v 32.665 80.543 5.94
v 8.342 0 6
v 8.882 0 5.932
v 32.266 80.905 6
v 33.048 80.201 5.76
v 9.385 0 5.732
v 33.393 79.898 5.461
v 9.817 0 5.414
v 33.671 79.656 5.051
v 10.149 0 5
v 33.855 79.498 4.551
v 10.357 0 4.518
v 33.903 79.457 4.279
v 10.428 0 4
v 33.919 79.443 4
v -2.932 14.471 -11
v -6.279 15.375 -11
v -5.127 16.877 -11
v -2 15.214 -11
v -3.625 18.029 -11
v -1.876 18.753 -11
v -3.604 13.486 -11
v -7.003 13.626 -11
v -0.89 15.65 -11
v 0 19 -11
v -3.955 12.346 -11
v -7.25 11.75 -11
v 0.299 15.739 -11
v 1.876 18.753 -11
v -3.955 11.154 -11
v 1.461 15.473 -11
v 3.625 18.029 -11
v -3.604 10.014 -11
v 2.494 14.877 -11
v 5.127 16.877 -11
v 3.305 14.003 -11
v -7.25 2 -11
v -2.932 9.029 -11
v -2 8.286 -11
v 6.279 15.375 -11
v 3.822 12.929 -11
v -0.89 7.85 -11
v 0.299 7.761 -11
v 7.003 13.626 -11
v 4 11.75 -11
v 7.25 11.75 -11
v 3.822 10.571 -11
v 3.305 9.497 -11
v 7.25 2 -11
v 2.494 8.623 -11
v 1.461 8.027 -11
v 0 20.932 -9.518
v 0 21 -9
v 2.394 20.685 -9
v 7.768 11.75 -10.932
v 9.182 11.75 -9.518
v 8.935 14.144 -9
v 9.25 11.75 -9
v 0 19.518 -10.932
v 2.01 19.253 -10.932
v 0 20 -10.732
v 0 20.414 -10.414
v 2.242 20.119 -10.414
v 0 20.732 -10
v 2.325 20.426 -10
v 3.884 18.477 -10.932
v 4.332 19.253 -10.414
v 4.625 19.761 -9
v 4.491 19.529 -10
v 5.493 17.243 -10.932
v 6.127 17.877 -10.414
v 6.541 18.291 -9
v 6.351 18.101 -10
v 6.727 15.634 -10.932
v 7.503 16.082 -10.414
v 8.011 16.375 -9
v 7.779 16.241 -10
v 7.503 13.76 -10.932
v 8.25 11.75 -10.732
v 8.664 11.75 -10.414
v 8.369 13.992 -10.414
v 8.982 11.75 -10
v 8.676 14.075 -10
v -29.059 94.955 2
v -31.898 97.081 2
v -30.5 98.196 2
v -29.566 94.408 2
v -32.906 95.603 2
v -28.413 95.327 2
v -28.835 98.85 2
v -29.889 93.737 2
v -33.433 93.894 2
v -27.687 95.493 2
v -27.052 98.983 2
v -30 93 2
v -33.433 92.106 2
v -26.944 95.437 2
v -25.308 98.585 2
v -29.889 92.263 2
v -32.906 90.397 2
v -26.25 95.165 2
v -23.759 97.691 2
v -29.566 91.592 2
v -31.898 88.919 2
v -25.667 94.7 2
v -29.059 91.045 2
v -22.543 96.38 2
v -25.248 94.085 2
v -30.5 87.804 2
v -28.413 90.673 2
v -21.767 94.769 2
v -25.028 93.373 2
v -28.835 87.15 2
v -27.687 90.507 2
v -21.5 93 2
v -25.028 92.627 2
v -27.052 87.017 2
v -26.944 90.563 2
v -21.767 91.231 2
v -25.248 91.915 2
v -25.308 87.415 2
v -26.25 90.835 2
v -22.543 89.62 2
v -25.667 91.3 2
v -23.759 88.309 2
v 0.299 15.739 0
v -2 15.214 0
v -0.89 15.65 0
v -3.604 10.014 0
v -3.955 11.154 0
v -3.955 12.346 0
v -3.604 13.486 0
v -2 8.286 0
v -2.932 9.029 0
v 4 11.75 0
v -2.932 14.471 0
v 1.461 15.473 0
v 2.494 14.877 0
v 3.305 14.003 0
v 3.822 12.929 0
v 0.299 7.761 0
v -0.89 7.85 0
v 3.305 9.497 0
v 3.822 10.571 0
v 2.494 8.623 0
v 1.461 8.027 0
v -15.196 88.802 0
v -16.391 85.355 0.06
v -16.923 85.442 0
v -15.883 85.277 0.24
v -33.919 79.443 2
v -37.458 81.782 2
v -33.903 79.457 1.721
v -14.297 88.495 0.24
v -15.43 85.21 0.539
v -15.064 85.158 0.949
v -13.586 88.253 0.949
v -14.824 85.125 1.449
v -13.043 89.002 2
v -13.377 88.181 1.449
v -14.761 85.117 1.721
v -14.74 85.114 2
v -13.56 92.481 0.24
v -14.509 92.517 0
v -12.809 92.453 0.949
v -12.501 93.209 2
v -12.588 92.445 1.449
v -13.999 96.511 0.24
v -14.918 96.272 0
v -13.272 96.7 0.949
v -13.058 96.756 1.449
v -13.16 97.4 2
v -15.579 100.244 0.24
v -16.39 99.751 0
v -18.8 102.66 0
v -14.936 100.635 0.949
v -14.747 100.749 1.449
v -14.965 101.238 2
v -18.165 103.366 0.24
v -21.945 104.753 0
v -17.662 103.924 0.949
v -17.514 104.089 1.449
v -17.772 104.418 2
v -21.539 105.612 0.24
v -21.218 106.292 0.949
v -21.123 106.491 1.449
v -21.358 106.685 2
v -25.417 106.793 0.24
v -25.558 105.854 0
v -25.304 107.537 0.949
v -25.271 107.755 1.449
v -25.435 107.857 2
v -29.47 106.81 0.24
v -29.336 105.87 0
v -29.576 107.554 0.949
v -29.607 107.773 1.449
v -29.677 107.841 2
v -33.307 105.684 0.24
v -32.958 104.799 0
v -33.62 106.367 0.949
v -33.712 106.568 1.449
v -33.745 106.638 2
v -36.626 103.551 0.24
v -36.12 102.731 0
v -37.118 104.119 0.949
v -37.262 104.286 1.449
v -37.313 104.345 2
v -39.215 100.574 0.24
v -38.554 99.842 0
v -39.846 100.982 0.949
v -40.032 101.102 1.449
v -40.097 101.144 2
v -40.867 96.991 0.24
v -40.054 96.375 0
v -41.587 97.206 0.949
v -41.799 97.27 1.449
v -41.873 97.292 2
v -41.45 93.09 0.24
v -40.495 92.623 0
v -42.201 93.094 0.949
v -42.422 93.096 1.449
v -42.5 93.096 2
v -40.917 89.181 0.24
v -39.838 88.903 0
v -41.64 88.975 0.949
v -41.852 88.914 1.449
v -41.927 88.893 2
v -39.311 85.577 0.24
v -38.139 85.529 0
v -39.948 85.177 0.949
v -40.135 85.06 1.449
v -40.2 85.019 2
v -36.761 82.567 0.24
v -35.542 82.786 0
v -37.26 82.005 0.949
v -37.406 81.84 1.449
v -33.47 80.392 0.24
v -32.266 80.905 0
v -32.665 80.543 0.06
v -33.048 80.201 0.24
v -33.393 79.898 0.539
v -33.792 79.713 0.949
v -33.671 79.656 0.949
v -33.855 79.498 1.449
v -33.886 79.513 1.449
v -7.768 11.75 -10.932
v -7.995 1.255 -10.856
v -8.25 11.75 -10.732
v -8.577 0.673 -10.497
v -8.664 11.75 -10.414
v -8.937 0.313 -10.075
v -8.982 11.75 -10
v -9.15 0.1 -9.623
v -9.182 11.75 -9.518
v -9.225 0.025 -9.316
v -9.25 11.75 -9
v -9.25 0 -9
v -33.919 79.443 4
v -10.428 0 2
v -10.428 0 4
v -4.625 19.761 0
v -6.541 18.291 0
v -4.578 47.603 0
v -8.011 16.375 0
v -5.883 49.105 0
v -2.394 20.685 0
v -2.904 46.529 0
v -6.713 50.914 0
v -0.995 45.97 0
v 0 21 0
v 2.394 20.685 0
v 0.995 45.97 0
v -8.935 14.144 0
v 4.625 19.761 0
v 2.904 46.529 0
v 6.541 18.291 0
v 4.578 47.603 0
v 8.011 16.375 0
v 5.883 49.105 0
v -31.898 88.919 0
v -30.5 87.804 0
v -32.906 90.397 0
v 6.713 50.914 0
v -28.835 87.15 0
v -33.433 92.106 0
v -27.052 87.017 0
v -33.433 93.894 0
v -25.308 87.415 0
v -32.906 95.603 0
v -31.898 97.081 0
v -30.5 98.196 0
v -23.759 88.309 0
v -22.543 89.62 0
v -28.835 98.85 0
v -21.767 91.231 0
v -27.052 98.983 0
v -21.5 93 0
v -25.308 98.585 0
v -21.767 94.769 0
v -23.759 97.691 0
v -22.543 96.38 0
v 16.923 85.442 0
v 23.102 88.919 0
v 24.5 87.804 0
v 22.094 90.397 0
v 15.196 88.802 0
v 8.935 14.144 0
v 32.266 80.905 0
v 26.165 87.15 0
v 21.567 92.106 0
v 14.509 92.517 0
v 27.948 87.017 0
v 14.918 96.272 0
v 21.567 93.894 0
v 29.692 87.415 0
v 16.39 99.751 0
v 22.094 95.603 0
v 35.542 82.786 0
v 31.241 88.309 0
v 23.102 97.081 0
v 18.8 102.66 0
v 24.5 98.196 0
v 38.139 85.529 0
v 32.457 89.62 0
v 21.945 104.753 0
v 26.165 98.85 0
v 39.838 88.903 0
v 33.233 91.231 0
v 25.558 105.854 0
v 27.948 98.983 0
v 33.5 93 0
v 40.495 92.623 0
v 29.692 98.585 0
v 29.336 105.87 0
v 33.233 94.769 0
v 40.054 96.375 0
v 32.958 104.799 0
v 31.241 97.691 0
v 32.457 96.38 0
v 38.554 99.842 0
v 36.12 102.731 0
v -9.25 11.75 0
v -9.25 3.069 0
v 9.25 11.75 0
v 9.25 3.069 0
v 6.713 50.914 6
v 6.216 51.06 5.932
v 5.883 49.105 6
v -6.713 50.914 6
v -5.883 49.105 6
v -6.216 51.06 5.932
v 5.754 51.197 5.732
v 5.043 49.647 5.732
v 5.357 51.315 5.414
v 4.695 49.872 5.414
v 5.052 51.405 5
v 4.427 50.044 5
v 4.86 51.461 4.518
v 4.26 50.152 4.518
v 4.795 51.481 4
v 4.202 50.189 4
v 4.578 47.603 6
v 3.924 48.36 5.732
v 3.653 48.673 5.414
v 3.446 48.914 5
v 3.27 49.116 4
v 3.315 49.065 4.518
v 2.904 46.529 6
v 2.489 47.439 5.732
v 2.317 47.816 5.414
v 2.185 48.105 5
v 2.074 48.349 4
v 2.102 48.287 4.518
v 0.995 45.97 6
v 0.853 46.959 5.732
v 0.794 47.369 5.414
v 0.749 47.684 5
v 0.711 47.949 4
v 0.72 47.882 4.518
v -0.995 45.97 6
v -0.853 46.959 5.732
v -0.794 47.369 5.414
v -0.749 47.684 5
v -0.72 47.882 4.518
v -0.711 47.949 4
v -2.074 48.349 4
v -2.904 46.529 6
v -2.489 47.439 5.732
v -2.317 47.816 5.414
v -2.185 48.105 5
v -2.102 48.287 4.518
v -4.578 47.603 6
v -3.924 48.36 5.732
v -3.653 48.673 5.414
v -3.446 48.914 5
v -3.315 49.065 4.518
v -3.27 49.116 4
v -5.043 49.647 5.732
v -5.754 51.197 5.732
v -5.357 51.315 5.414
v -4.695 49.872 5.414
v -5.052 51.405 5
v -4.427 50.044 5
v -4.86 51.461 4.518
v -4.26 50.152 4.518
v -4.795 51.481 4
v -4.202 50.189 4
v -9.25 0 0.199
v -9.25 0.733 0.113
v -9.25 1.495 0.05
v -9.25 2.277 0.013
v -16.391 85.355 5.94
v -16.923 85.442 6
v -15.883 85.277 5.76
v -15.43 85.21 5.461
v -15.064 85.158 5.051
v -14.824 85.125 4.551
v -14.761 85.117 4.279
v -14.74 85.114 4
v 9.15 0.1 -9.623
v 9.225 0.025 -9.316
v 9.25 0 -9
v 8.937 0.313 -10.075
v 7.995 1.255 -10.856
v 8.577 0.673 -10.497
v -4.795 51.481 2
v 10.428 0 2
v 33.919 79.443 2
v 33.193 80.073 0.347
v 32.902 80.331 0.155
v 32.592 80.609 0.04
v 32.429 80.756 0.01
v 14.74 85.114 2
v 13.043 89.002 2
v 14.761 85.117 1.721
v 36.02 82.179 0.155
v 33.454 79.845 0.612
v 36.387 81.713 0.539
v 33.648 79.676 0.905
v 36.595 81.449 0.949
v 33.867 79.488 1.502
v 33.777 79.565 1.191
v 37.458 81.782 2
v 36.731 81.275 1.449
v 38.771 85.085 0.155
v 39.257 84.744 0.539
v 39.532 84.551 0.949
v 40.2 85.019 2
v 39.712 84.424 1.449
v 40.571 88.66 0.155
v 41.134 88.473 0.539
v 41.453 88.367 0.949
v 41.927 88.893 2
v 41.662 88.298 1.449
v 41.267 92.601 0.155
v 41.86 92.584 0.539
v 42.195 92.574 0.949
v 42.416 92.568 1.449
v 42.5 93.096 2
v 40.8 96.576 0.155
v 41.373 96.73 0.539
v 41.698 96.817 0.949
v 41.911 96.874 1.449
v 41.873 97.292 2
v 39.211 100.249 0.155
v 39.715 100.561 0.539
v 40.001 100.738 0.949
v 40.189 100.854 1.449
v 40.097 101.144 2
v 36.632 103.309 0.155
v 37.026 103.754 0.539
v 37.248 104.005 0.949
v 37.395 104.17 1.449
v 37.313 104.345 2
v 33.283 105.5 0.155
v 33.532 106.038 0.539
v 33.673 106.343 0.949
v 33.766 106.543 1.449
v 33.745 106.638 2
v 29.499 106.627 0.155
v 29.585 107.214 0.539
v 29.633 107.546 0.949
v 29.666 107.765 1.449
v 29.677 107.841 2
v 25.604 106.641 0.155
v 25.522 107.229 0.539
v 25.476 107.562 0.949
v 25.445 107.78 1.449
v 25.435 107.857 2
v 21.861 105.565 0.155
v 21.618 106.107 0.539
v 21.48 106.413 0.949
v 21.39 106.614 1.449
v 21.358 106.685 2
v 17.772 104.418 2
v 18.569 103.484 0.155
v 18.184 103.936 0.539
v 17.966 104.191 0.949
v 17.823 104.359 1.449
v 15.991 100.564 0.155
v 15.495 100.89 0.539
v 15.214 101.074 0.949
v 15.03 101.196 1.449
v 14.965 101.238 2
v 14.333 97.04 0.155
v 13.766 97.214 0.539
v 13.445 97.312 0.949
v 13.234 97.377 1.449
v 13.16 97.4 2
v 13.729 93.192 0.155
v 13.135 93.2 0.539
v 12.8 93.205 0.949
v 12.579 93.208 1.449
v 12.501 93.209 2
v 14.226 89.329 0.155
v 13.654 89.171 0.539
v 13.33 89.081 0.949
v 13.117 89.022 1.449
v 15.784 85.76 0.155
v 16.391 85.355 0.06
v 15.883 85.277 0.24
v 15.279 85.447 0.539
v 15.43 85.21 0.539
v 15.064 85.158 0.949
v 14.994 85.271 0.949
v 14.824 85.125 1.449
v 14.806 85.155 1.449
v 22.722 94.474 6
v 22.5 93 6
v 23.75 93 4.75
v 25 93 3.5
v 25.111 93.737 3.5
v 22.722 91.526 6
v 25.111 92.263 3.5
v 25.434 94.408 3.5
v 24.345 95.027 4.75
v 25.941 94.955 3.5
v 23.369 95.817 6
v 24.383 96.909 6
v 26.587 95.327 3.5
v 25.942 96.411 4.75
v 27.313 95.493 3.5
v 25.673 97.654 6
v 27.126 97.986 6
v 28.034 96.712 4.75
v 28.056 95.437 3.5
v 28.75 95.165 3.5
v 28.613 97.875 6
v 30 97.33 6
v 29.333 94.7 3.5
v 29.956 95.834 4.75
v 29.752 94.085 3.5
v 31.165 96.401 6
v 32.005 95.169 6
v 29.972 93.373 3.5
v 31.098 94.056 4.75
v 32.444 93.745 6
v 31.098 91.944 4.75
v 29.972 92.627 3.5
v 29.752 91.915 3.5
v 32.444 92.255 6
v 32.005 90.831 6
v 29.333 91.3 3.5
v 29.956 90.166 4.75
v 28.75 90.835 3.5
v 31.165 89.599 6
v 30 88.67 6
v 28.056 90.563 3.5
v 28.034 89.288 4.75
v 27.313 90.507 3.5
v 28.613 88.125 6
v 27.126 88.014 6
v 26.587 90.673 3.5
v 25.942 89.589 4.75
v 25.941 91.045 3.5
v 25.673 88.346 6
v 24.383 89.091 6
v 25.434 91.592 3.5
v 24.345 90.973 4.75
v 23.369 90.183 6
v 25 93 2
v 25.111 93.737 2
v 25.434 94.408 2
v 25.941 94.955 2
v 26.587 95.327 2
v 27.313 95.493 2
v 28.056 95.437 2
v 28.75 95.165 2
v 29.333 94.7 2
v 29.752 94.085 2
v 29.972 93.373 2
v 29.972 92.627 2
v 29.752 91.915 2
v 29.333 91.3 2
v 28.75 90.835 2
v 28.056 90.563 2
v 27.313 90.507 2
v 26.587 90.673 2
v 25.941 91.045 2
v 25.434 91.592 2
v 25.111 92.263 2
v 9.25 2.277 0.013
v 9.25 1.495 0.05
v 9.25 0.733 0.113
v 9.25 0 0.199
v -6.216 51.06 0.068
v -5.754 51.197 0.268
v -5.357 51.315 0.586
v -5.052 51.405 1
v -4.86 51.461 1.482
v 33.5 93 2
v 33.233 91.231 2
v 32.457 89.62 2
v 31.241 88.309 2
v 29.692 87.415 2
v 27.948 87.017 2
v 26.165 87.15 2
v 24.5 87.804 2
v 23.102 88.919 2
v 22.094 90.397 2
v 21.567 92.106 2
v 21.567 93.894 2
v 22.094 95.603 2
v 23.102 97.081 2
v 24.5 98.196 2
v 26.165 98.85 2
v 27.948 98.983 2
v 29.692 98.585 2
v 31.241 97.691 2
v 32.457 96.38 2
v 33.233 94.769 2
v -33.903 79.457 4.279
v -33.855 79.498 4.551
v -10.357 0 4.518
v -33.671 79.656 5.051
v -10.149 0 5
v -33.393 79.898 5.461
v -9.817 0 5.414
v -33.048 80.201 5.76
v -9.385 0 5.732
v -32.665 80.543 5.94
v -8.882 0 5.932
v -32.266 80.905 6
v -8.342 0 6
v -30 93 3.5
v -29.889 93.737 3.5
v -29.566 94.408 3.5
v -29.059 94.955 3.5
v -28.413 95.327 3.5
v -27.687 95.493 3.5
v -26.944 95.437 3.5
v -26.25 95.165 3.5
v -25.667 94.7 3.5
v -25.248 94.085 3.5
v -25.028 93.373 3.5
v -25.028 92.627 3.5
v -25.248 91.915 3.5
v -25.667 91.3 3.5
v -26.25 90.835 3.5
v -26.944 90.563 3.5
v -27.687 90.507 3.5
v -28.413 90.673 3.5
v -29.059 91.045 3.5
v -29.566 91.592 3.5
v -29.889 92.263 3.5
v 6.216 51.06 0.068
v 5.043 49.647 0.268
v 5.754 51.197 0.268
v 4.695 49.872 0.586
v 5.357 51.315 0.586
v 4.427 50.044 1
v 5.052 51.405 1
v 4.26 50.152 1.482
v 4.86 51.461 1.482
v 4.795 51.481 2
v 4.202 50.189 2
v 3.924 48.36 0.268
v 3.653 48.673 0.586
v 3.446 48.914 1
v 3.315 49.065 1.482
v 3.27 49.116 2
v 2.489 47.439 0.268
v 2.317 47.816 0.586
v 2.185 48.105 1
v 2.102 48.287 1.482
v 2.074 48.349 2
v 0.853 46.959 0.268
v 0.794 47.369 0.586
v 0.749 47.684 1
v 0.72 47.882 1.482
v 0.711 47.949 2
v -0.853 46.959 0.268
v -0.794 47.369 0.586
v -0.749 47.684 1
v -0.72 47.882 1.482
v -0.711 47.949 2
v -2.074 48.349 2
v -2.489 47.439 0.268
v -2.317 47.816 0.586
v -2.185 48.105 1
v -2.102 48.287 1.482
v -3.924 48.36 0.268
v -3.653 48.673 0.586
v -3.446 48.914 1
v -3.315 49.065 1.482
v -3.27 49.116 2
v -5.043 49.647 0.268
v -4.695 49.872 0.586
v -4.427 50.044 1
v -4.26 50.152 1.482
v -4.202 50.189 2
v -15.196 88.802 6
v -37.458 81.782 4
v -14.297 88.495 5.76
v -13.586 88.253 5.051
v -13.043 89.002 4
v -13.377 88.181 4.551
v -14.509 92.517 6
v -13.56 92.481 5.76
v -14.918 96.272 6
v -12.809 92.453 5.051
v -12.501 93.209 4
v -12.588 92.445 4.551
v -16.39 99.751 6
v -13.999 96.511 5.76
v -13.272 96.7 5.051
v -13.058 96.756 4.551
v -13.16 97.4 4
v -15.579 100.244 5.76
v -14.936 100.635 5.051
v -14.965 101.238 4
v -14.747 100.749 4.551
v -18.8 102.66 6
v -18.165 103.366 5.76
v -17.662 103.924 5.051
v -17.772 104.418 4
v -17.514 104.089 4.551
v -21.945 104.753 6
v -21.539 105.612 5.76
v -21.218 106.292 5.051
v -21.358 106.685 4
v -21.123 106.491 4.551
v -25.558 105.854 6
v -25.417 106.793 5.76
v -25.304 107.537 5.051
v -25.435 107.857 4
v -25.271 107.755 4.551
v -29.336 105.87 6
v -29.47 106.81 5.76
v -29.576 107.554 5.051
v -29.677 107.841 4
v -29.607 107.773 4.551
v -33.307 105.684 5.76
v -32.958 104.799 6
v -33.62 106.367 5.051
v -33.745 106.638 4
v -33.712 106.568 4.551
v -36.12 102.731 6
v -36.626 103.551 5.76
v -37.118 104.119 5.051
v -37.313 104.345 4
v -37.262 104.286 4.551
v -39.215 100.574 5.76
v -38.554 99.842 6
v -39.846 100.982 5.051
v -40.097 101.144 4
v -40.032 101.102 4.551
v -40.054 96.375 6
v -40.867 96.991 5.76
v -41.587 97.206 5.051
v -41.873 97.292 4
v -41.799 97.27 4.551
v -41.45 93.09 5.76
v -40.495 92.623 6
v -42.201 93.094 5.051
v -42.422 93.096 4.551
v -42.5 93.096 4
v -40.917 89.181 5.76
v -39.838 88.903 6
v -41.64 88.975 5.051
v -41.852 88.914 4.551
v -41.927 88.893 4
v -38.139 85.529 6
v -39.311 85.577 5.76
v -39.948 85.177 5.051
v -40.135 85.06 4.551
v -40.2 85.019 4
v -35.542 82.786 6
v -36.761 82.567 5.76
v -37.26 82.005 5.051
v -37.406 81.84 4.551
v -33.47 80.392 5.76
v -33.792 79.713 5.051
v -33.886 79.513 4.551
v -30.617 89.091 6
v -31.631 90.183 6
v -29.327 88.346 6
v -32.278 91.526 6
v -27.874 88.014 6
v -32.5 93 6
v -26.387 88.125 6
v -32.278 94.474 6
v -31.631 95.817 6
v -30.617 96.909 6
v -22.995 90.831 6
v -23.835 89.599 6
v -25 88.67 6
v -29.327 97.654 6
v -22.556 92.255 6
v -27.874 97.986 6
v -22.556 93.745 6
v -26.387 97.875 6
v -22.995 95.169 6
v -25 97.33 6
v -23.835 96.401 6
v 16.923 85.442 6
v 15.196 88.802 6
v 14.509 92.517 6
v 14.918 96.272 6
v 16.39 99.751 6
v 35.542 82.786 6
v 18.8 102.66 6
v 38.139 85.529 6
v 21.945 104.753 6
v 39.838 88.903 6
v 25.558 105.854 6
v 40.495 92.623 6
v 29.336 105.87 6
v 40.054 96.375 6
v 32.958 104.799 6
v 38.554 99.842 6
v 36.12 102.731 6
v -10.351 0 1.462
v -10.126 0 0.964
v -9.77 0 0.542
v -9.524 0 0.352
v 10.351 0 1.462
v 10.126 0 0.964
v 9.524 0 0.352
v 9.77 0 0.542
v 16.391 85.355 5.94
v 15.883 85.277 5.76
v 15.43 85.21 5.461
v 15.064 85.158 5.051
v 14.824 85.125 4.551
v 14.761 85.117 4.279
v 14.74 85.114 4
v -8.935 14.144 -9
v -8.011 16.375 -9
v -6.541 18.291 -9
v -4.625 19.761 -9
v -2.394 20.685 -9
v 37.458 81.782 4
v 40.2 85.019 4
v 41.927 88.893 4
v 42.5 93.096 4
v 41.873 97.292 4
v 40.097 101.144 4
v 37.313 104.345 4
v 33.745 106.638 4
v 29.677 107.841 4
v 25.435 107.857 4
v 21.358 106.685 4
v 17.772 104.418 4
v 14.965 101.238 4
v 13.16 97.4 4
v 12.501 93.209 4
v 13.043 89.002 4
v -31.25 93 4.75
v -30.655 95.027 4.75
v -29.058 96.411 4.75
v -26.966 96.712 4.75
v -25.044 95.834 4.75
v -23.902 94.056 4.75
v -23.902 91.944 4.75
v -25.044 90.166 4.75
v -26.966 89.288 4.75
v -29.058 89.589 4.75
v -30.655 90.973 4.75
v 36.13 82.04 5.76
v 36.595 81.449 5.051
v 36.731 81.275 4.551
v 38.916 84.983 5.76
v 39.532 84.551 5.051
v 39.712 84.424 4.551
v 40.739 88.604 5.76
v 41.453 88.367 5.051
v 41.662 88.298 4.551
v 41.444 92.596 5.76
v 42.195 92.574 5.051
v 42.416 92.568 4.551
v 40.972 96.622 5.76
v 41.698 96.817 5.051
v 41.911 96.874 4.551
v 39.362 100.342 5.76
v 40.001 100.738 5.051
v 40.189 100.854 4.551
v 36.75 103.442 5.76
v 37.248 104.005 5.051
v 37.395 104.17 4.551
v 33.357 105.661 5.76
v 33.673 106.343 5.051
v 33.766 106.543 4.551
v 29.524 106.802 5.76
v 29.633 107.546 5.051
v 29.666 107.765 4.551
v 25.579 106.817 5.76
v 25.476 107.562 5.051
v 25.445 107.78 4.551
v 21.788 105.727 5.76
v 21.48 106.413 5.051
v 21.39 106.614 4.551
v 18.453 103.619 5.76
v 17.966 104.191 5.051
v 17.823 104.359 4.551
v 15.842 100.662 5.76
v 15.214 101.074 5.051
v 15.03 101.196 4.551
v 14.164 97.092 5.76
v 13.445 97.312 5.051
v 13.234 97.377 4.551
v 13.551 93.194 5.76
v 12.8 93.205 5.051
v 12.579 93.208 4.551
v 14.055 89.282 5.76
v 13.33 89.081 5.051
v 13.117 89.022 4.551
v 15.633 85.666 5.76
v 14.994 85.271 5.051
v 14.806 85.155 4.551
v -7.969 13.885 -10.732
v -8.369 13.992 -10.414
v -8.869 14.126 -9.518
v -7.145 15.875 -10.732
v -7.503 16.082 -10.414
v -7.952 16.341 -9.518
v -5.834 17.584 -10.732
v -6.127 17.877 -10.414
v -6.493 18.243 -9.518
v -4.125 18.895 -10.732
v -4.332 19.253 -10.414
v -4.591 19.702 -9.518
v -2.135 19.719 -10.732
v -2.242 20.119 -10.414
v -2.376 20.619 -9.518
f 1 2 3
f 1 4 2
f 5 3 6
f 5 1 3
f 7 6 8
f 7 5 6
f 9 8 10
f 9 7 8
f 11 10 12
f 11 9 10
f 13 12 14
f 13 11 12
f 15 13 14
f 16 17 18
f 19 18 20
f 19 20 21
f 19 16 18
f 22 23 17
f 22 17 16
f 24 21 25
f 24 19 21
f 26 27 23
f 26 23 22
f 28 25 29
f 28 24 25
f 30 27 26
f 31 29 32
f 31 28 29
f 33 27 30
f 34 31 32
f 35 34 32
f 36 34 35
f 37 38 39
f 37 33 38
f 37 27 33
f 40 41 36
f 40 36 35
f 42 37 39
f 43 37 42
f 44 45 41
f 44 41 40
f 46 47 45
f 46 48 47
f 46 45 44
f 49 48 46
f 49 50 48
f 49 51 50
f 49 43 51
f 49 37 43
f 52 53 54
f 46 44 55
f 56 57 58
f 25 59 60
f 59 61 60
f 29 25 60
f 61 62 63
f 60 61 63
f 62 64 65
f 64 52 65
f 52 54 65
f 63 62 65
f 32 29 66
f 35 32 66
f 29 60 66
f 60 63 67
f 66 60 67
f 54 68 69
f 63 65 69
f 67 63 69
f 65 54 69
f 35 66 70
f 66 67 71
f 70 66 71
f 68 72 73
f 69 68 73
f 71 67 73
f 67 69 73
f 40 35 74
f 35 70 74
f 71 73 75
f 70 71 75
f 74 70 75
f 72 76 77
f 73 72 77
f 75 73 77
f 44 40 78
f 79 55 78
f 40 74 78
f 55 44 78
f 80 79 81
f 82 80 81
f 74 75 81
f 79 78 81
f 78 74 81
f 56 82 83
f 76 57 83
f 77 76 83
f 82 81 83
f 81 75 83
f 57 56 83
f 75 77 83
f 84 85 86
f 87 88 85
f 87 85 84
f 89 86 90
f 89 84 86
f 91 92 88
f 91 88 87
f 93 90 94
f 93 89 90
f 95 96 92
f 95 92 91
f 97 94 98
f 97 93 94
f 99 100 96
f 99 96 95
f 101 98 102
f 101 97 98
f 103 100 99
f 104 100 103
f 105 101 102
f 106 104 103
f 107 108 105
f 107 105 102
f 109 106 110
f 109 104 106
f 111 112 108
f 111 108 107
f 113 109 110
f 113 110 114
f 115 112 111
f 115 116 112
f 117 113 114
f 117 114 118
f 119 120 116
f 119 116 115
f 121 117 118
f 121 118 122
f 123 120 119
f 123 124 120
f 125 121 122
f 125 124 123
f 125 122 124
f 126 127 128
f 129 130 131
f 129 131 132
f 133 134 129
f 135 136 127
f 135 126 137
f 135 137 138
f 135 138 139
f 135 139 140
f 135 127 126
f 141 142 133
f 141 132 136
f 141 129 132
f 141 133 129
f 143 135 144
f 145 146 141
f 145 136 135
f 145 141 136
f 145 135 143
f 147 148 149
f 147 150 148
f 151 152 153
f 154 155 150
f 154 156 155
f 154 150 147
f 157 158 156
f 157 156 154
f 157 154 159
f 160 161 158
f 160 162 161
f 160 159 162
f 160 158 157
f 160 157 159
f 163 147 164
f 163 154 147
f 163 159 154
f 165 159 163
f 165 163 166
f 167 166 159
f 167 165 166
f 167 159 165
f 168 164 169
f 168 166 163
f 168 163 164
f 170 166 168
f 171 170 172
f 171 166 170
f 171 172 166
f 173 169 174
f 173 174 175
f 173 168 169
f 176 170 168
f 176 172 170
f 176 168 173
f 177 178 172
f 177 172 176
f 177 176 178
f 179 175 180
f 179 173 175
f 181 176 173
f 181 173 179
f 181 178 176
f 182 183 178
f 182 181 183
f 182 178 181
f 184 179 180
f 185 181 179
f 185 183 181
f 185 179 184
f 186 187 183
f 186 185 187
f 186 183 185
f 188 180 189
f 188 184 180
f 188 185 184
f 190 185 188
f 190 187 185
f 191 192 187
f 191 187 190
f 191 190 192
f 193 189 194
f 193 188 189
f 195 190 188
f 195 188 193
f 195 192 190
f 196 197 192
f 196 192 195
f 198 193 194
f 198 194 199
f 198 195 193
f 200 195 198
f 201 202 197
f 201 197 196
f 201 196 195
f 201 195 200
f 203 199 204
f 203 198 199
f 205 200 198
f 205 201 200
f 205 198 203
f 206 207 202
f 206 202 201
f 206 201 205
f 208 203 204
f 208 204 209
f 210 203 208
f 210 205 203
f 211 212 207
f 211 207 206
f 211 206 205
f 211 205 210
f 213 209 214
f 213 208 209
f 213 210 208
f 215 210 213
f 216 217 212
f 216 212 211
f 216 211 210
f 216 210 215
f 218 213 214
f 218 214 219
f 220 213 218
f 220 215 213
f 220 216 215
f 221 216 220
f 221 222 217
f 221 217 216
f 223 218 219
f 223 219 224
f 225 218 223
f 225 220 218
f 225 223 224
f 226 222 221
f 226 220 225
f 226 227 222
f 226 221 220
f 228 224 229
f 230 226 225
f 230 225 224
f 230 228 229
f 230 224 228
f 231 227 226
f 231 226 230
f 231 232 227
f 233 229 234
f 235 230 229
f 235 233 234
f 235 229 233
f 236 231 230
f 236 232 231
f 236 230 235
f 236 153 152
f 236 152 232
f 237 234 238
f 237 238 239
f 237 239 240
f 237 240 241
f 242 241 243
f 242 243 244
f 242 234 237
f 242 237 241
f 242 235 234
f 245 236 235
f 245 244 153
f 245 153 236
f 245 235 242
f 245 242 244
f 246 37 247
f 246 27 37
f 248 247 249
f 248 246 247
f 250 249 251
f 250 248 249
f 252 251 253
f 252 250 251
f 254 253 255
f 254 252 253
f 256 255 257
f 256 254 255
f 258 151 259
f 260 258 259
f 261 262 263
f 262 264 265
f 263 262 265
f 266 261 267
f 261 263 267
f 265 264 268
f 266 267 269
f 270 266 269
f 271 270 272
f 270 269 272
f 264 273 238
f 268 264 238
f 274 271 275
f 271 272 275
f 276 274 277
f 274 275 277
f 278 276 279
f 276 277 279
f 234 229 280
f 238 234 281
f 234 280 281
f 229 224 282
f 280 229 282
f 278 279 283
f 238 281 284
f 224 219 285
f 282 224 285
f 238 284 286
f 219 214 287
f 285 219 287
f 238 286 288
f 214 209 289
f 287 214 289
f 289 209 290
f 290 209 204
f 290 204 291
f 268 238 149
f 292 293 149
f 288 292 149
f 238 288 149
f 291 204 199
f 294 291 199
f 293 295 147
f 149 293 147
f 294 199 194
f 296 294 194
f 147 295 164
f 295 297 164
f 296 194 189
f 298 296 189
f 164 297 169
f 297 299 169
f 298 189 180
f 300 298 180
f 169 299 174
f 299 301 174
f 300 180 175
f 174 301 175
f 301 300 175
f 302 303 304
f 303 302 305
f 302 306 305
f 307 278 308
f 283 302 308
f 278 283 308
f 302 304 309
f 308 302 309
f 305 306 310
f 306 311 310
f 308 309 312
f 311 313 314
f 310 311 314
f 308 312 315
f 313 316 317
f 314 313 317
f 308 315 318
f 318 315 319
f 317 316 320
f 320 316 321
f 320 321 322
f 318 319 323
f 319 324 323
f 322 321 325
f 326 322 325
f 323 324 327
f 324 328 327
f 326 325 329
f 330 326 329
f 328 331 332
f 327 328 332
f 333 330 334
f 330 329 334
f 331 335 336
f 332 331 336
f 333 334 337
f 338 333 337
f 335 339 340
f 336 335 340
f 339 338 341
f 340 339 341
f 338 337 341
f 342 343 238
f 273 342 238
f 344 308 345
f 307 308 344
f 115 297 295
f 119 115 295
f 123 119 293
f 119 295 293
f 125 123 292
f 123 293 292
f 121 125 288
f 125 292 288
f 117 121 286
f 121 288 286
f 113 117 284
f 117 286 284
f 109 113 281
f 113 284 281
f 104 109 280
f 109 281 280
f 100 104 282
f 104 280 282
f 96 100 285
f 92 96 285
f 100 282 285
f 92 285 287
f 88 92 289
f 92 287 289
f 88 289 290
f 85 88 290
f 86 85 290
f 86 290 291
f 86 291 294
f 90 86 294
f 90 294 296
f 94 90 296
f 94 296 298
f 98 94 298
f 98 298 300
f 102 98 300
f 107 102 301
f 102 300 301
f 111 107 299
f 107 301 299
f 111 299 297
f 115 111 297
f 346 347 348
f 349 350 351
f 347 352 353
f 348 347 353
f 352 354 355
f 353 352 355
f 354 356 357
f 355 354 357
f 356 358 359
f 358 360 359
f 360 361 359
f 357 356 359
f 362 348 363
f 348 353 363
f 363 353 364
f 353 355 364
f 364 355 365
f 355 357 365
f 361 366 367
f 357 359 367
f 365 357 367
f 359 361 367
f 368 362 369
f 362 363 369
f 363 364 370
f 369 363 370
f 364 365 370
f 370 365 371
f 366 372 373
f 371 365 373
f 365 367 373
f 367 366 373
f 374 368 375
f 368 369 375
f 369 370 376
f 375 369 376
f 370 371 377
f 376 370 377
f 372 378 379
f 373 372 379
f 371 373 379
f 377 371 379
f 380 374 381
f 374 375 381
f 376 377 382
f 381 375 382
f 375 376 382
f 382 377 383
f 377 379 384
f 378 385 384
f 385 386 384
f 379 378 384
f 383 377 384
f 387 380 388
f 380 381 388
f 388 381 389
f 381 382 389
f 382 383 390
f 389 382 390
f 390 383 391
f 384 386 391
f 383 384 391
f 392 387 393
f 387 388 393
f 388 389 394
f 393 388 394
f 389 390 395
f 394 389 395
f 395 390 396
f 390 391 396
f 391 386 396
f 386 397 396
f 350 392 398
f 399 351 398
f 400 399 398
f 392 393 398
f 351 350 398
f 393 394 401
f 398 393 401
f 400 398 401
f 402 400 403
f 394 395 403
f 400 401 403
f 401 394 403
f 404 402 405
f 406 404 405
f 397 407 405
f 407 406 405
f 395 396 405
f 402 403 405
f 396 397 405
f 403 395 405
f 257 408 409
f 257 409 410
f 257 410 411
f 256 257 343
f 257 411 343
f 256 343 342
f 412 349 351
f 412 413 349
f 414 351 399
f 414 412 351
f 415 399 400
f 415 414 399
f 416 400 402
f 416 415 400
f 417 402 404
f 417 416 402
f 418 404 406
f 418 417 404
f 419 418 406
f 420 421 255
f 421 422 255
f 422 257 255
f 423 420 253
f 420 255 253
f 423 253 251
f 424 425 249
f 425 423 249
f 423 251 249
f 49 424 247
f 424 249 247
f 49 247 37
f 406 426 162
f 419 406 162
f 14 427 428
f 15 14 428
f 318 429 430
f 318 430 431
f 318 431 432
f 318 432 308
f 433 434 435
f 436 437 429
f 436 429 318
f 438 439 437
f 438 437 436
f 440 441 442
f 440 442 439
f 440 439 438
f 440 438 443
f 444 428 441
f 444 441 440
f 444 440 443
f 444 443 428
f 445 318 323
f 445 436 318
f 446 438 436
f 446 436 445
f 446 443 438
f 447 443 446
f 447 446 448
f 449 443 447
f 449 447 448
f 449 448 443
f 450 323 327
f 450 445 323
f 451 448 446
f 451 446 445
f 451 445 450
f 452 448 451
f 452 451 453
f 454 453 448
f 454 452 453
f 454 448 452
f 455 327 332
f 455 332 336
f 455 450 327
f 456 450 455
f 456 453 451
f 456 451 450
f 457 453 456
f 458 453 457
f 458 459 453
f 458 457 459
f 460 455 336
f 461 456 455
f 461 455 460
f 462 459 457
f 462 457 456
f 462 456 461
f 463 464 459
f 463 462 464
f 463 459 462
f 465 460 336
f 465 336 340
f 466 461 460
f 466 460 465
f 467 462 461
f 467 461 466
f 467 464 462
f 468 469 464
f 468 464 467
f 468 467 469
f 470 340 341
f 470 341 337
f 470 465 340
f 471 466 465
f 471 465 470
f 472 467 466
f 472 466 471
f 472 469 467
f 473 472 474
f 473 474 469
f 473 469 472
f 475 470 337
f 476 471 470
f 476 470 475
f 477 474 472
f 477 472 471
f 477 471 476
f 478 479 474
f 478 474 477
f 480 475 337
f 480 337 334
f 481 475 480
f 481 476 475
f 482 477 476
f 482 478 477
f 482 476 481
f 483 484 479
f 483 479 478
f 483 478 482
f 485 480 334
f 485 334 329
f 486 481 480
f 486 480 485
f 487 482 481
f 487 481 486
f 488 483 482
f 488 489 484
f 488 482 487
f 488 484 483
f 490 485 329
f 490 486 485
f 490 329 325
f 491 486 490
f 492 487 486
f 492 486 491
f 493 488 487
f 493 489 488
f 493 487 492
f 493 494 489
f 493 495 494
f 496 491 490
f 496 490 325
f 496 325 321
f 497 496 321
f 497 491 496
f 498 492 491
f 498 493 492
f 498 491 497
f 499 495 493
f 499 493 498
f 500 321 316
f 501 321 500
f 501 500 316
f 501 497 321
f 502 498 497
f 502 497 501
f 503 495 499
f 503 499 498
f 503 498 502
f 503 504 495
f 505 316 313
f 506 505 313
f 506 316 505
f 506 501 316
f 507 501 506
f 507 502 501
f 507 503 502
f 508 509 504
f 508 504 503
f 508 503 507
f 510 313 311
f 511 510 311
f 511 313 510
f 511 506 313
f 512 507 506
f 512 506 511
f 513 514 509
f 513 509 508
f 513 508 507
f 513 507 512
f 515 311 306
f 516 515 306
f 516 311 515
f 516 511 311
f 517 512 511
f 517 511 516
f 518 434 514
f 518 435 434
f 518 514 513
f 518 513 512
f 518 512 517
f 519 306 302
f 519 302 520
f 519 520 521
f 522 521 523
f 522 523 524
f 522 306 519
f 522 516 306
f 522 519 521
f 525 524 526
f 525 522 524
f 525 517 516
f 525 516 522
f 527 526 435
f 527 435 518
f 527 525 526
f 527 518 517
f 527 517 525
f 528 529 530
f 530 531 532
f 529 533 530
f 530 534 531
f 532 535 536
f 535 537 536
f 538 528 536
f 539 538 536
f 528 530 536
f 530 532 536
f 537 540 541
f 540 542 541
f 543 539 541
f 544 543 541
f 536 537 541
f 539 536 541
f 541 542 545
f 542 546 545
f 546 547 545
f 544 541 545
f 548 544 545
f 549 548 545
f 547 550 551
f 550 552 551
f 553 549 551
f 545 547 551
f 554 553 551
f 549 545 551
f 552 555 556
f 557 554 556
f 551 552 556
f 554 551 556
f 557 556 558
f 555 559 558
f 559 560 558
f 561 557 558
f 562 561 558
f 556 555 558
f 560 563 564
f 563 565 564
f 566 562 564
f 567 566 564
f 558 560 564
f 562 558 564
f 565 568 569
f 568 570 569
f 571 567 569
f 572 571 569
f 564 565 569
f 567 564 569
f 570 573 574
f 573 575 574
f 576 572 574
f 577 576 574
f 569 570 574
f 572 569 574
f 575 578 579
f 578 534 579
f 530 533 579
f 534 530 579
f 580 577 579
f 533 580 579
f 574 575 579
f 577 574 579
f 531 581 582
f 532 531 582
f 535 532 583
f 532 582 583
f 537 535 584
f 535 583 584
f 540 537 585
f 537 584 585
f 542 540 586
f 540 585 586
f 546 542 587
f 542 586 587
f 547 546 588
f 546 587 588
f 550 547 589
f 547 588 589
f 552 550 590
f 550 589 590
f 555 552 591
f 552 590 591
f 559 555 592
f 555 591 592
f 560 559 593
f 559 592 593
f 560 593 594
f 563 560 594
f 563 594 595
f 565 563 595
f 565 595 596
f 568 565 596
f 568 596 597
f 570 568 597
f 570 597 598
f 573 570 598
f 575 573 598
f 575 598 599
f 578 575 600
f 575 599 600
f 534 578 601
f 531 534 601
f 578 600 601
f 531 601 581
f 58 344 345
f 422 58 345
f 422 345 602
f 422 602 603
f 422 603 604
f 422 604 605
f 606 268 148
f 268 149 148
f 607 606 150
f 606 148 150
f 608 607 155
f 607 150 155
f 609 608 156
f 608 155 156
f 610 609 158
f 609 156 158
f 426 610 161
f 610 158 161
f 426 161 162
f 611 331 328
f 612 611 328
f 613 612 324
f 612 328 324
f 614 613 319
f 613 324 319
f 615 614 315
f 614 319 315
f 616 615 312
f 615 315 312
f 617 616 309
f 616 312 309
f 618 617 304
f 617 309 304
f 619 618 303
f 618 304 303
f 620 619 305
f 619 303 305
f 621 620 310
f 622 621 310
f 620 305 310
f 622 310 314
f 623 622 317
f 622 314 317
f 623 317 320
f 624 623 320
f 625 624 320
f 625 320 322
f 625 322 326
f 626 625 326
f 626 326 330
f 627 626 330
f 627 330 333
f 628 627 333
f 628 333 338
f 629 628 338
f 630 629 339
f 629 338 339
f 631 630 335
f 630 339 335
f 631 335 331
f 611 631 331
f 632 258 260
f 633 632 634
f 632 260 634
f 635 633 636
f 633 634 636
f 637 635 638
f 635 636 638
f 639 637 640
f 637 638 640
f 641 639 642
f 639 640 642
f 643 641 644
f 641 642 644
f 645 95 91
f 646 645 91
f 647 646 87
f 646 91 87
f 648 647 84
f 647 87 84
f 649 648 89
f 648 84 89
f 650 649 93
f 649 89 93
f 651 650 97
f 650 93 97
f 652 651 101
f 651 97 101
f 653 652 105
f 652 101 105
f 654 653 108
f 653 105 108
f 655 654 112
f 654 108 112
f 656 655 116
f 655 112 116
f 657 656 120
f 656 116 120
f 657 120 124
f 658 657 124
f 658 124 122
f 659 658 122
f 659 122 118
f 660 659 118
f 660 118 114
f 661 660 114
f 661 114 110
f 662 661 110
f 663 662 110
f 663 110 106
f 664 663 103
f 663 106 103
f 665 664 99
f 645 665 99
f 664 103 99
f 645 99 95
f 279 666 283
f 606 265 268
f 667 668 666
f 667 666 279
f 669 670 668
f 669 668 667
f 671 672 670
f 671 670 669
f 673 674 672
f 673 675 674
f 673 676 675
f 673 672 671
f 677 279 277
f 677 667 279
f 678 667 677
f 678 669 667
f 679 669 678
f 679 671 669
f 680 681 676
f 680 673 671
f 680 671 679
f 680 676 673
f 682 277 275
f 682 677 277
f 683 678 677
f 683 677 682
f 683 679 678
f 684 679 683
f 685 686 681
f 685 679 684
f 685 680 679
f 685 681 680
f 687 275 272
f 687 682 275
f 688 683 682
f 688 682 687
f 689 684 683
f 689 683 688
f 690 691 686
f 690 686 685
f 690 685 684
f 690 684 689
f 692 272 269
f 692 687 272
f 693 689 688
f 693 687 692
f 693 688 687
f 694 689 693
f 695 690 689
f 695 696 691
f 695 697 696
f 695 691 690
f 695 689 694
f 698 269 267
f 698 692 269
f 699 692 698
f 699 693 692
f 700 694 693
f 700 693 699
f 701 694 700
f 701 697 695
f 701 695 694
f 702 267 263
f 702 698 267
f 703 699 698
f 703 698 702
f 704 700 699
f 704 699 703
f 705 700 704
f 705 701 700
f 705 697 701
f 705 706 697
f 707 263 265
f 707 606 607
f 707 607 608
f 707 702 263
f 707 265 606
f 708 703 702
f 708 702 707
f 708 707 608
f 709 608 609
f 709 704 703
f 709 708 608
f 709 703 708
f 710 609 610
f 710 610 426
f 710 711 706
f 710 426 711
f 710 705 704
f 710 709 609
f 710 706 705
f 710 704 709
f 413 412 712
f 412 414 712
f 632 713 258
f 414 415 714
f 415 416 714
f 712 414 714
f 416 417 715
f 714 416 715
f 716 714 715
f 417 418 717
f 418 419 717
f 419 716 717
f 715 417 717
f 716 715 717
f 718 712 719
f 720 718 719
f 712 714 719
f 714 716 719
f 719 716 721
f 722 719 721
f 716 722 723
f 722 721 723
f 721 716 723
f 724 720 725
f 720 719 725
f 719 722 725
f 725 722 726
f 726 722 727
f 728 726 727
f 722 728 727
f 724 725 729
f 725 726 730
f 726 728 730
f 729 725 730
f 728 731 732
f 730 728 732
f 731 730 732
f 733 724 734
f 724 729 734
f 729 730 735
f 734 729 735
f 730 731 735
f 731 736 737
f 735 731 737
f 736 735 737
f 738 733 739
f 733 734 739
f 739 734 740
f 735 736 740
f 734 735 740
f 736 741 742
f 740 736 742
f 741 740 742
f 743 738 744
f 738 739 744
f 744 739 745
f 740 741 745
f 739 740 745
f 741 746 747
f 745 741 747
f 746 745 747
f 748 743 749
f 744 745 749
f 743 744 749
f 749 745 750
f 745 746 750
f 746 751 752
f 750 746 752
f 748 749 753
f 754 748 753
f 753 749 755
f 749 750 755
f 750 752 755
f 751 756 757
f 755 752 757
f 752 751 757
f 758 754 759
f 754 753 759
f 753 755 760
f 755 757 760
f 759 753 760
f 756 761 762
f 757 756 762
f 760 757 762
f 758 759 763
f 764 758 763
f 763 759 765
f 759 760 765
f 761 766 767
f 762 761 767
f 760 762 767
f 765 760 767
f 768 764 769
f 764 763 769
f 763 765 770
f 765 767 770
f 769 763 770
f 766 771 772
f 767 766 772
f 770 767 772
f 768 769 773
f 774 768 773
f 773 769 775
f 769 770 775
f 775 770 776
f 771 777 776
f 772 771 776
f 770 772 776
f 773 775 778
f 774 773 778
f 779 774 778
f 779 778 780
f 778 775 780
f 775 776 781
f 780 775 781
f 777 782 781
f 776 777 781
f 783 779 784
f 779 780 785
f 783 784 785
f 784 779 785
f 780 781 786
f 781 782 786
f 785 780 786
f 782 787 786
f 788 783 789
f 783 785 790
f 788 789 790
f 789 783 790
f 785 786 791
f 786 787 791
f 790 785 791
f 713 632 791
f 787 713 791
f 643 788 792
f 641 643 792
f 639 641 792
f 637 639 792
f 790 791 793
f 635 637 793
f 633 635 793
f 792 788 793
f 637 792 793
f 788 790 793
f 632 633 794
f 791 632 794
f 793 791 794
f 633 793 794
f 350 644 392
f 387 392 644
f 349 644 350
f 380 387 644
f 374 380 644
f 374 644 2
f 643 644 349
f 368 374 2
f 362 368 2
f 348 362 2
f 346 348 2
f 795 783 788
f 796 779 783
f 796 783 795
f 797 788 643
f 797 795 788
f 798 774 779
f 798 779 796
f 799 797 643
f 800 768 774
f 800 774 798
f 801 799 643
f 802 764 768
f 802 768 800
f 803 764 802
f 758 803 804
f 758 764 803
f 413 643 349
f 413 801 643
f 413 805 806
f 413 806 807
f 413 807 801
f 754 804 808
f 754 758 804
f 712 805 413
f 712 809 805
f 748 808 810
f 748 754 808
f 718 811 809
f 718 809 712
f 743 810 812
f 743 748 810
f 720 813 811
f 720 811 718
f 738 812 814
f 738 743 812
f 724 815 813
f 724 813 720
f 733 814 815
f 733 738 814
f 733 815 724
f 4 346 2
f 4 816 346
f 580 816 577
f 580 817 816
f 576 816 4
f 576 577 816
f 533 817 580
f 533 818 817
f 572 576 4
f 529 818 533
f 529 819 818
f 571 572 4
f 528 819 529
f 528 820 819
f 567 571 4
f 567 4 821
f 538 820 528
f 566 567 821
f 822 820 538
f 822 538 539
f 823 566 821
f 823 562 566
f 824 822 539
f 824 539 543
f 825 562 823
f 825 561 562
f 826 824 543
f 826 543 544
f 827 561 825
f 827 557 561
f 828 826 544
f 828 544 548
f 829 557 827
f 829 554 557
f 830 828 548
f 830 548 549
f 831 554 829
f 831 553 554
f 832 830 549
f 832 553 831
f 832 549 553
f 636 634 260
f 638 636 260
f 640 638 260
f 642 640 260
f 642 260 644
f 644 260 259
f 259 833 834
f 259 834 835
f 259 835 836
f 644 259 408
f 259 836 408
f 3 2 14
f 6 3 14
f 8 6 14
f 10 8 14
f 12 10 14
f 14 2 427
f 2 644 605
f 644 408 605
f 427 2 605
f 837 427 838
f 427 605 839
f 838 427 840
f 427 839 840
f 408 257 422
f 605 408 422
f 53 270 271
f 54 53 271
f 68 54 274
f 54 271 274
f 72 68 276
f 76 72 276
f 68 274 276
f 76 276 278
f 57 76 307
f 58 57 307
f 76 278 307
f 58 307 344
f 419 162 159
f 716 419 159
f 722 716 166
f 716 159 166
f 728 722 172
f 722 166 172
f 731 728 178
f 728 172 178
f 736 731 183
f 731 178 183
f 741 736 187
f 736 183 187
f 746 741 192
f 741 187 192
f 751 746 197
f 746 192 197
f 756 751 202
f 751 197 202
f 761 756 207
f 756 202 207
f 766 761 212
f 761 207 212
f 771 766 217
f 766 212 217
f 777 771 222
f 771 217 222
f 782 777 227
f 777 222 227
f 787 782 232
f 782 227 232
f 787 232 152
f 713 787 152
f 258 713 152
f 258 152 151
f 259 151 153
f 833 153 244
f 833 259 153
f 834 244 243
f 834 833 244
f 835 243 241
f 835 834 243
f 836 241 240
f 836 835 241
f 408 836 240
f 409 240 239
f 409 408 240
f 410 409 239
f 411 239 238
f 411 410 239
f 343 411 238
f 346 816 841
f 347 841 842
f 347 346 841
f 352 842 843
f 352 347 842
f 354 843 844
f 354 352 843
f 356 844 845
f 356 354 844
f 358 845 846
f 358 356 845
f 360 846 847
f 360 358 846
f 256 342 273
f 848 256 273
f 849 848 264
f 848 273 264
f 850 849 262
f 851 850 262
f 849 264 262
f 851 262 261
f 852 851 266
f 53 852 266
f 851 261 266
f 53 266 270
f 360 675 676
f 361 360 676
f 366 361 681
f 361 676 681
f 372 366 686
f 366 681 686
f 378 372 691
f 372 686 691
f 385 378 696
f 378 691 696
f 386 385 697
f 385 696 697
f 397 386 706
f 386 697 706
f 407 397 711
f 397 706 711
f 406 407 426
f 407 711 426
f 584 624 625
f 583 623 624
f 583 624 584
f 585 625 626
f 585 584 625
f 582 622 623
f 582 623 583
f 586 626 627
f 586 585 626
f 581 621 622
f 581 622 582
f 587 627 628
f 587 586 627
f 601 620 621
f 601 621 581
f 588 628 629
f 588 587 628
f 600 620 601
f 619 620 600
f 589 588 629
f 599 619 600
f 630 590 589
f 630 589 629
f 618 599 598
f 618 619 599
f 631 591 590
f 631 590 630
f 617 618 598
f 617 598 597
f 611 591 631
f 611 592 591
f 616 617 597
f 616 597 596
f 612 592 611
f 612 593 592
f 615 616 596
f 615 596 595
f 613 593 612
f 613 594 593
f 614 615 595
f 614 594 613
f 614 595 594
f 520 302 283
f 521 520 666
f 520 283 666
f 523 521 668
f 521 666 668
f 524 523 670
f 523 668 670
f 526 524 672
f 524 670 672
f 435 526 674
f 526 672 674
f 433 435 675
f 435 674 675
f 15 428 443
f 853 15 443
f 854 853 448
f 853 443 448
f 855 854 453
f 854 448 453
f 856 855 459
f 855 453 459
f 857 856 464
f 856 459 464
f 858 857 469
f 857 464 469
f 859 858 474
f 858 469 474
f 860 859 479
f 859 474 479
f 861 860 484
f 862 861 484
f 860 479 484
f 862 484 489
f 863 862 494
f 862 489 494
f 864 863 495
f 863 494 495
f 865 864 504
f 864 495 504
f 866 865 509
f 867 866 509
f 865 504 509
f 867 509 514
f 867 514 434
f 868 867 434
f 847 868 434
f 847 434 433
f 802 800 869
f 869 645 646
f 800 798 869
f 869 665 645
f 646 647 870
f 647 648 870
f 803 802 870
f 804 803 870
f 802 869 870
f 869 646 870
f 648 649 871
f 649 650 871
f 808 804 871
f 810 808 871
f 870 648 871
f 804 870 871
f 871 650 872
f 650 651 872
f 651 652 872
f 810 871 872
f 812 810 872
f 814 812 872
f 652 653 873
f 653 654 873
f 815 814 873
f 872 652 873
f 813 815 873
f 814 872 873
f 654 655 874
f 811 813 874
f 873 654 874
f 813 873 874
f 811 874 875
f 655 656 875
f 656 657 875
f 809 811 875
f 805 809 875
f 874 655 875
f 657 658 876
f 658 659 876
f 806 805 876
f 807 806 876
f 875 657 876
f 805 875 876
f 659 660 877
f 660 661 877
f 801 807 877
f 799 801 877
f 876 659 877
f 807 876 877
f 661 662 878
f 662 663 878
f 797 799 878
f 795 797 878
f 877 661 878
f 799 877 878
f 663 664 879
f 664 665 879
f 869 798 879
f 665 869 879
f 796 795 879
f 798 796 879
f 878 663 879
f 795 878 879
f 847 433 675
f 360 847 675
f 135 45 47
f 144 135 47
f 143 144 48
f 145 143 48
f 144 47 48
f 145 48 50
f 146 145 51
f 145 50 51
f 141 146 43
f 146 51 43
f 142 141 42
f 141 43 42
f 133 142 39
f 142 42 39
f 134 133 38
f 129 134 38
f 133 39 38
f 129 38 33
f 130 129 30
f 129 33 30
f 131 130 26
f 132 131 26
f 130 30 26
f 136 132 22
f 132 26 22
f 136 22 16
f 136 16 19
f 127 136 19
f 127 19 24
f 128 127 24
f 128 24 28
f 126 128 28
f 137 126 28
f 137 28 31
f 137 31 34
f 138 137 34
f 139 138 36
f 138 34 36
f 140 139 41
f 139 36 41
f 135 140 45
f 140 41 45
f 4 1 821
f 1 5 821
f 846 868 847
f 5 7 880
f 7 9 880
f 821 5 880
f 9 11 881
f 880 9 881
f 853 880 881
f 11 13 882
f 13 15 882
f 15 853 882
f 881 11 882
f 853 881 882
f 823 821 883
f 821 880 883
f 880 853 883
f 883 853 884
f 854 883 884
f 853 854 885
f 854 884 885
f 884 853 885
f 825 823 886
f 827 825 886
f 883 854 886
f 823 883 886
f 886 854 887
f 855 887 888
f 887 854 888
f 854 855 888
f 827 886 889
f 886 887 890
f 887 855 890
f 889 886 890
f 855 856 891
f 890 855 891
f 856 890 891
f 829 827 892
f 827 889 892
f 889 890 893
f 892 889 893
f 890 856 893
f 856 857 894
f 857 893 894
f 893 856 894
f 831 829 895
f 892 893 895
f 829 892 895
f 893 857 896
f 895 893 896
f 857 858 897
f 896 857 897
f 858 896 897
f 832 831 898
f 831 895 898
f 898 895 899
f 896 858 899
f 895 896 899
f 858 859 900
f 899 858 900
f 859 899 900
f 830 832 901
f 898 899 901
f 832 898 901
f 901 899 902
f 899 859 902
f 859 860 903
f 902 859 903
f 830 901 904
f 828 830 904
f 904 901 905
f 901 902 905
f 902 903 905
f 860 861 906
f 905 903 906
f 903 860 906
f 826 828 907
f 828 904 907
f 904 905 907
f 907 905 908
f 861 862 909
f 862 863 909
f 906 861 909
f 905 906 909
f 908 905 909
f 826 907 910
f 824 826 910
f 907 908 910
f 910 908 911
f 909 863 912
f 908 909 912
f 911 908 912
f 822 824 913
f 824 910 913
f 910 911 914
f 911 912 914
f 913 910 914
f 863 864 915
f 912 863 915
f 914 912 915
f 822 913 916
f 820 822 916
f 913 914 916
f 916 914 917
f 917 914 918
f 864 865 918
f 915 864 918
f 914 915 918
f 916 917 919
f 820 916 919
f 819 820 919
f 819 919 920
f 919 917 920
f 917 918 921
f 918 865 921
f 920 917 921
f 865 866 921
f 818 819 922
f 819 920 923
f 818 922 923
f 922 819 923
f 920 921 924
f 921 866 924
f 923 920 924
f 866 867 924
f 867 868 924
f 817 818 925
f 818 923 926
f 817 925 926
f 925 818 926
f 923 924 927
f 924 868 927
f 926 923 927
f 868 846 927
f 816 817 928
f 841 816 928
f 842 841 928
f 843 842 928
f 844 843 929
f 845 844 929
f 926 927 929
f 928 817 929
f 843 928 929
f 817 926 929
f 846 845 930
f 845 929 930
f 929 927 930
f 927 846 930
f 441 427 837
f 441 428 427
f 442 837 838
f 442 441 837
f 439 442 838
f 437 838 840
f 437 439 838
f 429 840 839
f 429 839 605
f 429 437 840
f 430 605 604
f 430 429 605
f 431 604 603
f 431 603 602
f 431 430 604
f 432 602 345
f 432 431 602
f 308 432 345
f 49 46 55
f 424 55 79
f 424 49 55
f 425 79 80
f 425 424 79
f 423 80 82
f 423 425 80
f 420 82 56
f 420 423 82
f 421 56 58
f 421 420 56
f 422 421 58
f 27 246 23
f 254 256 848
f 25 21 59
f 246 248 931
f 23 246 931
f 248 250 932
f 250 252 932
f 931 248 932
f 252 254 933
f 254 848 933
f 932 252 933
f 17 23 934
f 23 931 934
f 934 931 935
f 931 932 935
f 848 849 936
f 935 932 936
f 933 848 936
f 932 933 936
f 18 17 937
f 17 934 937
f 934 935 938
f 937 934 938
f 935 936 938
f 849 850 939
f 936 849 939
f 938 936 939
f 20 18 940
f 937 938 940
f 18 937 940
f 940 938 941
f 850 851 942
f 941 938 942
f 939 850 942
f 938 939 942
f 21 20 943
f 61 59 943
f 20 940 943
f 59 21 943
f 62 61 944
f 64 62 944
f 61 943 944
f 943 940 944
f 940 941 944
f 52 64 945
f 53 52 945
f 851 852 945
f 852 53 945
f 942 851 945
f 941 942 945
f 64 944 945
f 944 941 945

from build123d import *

# Parameters (mm, degrees)
F1_DEPTH       = 6
F3_DEPTH       = 11
F5_D           = 5
F5_CSINK_D     = 10
F5_CSINK_ANGLE = 90
F6_R           = 6
F7_DEPTH       = 2
F8_R           = 2
F9_R           = 4
F10_DEPTH      = 11


with BuildPart() as f1:
    # F0 (on Top) → F1 (new body)
    with BuildSketch(Plane.XY):
        with BuildLine():
            Line((-10.428029, 0), (0, 0))
            Line((0, 0), (10.428029, 0))
            Line((10.428029, 0), (33.919224, 79.442952))
            ThreePointArc((33.919224, 79.442952), (31.753425, 107.38431), (14.740144, 85.114185))
            Line((14.740144, 85.114185), (4.79477, 51.480738))
            ThreePointArc((4.79477, 51.480738), (0, 47.898546), (-4.79477, 51.480738))
            Line((-4.79477, 51.480738), (-14.740144, 85.114185))
            ThreePointArc((-14.740144, 85.114185), (-31.753425, 107.38431), (-33.919224, 79.442952))
            Line((-33.919224, 79.442952), (-10.428029, 0))
        make_face()
    extrude(amount=F1_DEPTH)

    # F2 (on face) → F3 (join)
    with BuildSketch(Plane(origin=(0, 0, 0), x_dir=(1, 0, 0), z_dir=(0, 0, -1))):
        with BuildLine():
            Line((9.25, 0), (0, 0))
            Line((0, 0), (-9.25, 0))
            Line((-9.25, 0), (-9.25, -11.75))
            ThreePointArc((-9.25, -11.75), (-6.540738, -18.290738), (0, -21))
            ThreePointArc((0, -21), (6.540738, -18.290738), (9.25, -11.75))
            Line((9.25, -11.75), (9.25, 0))
        make_face()
    extrude(amount=F3_DEPTH)

    # F5 (through all)
    with Locations(Plane.XY.offset(6)):
        with Locations((27.5, 93), (-27.5, 93)):
            CounterSinkHole(F5_D / 2, F5_CSINK_D / 2, counter_sink_angle=F5_CSINK_ANGLE)

    # F6 (on face) → F7 (cut)
    with BuildSketch(Plane(origin=(0, 0, 0), x_dir=(1, 0, 0), z_dir=(0, 0, -1))):
        with Locations((27.5, -93)):
            Circle(F6_R)
        with Locations((-27.5, -93)):
            Circle(F6_R)
    extrude(amount=-F7_DEPTH, mode=Mode.SUBTRACT)

    # F8
    f8_edges = [f1.edges().sort_by_distance(p)[0] for p in [
        (22.173627, 39.721476, 0),
        (31.753425, 107.38431, 0),
        (9.767457, 68.297461, 6),
        (0, 47.898546, 0),
        (-9.767457, 68.297461, 0),
        (-31.753425, 107.38431, 0),
        (-22.173627, 39.721476, 0),
        (-9.25, 5.875, -11),
        (0, 0, -11),
        (-31.753425, 107.38431, 6),
        (-22.173627, 39.721476, 6),
        (22.173627, 39.721476, 6),
        (31.753425, 107.38431, 6),
    ]]
    fillet(f8_edges, radius=F8_R)

    # F9 (on face) → F10 (cut)
    with BuildSketch(Plane(origin=(0, 0, -11), x_dir=(1, 0, 0), z_dir=(0, 0, -1))):
        with Locations((0, -11.75)):
            Circle(F9_R)
    extrude(amount=-F10_DEPTH, mode=Mode.SUBTRACT)


solid = f1.part
